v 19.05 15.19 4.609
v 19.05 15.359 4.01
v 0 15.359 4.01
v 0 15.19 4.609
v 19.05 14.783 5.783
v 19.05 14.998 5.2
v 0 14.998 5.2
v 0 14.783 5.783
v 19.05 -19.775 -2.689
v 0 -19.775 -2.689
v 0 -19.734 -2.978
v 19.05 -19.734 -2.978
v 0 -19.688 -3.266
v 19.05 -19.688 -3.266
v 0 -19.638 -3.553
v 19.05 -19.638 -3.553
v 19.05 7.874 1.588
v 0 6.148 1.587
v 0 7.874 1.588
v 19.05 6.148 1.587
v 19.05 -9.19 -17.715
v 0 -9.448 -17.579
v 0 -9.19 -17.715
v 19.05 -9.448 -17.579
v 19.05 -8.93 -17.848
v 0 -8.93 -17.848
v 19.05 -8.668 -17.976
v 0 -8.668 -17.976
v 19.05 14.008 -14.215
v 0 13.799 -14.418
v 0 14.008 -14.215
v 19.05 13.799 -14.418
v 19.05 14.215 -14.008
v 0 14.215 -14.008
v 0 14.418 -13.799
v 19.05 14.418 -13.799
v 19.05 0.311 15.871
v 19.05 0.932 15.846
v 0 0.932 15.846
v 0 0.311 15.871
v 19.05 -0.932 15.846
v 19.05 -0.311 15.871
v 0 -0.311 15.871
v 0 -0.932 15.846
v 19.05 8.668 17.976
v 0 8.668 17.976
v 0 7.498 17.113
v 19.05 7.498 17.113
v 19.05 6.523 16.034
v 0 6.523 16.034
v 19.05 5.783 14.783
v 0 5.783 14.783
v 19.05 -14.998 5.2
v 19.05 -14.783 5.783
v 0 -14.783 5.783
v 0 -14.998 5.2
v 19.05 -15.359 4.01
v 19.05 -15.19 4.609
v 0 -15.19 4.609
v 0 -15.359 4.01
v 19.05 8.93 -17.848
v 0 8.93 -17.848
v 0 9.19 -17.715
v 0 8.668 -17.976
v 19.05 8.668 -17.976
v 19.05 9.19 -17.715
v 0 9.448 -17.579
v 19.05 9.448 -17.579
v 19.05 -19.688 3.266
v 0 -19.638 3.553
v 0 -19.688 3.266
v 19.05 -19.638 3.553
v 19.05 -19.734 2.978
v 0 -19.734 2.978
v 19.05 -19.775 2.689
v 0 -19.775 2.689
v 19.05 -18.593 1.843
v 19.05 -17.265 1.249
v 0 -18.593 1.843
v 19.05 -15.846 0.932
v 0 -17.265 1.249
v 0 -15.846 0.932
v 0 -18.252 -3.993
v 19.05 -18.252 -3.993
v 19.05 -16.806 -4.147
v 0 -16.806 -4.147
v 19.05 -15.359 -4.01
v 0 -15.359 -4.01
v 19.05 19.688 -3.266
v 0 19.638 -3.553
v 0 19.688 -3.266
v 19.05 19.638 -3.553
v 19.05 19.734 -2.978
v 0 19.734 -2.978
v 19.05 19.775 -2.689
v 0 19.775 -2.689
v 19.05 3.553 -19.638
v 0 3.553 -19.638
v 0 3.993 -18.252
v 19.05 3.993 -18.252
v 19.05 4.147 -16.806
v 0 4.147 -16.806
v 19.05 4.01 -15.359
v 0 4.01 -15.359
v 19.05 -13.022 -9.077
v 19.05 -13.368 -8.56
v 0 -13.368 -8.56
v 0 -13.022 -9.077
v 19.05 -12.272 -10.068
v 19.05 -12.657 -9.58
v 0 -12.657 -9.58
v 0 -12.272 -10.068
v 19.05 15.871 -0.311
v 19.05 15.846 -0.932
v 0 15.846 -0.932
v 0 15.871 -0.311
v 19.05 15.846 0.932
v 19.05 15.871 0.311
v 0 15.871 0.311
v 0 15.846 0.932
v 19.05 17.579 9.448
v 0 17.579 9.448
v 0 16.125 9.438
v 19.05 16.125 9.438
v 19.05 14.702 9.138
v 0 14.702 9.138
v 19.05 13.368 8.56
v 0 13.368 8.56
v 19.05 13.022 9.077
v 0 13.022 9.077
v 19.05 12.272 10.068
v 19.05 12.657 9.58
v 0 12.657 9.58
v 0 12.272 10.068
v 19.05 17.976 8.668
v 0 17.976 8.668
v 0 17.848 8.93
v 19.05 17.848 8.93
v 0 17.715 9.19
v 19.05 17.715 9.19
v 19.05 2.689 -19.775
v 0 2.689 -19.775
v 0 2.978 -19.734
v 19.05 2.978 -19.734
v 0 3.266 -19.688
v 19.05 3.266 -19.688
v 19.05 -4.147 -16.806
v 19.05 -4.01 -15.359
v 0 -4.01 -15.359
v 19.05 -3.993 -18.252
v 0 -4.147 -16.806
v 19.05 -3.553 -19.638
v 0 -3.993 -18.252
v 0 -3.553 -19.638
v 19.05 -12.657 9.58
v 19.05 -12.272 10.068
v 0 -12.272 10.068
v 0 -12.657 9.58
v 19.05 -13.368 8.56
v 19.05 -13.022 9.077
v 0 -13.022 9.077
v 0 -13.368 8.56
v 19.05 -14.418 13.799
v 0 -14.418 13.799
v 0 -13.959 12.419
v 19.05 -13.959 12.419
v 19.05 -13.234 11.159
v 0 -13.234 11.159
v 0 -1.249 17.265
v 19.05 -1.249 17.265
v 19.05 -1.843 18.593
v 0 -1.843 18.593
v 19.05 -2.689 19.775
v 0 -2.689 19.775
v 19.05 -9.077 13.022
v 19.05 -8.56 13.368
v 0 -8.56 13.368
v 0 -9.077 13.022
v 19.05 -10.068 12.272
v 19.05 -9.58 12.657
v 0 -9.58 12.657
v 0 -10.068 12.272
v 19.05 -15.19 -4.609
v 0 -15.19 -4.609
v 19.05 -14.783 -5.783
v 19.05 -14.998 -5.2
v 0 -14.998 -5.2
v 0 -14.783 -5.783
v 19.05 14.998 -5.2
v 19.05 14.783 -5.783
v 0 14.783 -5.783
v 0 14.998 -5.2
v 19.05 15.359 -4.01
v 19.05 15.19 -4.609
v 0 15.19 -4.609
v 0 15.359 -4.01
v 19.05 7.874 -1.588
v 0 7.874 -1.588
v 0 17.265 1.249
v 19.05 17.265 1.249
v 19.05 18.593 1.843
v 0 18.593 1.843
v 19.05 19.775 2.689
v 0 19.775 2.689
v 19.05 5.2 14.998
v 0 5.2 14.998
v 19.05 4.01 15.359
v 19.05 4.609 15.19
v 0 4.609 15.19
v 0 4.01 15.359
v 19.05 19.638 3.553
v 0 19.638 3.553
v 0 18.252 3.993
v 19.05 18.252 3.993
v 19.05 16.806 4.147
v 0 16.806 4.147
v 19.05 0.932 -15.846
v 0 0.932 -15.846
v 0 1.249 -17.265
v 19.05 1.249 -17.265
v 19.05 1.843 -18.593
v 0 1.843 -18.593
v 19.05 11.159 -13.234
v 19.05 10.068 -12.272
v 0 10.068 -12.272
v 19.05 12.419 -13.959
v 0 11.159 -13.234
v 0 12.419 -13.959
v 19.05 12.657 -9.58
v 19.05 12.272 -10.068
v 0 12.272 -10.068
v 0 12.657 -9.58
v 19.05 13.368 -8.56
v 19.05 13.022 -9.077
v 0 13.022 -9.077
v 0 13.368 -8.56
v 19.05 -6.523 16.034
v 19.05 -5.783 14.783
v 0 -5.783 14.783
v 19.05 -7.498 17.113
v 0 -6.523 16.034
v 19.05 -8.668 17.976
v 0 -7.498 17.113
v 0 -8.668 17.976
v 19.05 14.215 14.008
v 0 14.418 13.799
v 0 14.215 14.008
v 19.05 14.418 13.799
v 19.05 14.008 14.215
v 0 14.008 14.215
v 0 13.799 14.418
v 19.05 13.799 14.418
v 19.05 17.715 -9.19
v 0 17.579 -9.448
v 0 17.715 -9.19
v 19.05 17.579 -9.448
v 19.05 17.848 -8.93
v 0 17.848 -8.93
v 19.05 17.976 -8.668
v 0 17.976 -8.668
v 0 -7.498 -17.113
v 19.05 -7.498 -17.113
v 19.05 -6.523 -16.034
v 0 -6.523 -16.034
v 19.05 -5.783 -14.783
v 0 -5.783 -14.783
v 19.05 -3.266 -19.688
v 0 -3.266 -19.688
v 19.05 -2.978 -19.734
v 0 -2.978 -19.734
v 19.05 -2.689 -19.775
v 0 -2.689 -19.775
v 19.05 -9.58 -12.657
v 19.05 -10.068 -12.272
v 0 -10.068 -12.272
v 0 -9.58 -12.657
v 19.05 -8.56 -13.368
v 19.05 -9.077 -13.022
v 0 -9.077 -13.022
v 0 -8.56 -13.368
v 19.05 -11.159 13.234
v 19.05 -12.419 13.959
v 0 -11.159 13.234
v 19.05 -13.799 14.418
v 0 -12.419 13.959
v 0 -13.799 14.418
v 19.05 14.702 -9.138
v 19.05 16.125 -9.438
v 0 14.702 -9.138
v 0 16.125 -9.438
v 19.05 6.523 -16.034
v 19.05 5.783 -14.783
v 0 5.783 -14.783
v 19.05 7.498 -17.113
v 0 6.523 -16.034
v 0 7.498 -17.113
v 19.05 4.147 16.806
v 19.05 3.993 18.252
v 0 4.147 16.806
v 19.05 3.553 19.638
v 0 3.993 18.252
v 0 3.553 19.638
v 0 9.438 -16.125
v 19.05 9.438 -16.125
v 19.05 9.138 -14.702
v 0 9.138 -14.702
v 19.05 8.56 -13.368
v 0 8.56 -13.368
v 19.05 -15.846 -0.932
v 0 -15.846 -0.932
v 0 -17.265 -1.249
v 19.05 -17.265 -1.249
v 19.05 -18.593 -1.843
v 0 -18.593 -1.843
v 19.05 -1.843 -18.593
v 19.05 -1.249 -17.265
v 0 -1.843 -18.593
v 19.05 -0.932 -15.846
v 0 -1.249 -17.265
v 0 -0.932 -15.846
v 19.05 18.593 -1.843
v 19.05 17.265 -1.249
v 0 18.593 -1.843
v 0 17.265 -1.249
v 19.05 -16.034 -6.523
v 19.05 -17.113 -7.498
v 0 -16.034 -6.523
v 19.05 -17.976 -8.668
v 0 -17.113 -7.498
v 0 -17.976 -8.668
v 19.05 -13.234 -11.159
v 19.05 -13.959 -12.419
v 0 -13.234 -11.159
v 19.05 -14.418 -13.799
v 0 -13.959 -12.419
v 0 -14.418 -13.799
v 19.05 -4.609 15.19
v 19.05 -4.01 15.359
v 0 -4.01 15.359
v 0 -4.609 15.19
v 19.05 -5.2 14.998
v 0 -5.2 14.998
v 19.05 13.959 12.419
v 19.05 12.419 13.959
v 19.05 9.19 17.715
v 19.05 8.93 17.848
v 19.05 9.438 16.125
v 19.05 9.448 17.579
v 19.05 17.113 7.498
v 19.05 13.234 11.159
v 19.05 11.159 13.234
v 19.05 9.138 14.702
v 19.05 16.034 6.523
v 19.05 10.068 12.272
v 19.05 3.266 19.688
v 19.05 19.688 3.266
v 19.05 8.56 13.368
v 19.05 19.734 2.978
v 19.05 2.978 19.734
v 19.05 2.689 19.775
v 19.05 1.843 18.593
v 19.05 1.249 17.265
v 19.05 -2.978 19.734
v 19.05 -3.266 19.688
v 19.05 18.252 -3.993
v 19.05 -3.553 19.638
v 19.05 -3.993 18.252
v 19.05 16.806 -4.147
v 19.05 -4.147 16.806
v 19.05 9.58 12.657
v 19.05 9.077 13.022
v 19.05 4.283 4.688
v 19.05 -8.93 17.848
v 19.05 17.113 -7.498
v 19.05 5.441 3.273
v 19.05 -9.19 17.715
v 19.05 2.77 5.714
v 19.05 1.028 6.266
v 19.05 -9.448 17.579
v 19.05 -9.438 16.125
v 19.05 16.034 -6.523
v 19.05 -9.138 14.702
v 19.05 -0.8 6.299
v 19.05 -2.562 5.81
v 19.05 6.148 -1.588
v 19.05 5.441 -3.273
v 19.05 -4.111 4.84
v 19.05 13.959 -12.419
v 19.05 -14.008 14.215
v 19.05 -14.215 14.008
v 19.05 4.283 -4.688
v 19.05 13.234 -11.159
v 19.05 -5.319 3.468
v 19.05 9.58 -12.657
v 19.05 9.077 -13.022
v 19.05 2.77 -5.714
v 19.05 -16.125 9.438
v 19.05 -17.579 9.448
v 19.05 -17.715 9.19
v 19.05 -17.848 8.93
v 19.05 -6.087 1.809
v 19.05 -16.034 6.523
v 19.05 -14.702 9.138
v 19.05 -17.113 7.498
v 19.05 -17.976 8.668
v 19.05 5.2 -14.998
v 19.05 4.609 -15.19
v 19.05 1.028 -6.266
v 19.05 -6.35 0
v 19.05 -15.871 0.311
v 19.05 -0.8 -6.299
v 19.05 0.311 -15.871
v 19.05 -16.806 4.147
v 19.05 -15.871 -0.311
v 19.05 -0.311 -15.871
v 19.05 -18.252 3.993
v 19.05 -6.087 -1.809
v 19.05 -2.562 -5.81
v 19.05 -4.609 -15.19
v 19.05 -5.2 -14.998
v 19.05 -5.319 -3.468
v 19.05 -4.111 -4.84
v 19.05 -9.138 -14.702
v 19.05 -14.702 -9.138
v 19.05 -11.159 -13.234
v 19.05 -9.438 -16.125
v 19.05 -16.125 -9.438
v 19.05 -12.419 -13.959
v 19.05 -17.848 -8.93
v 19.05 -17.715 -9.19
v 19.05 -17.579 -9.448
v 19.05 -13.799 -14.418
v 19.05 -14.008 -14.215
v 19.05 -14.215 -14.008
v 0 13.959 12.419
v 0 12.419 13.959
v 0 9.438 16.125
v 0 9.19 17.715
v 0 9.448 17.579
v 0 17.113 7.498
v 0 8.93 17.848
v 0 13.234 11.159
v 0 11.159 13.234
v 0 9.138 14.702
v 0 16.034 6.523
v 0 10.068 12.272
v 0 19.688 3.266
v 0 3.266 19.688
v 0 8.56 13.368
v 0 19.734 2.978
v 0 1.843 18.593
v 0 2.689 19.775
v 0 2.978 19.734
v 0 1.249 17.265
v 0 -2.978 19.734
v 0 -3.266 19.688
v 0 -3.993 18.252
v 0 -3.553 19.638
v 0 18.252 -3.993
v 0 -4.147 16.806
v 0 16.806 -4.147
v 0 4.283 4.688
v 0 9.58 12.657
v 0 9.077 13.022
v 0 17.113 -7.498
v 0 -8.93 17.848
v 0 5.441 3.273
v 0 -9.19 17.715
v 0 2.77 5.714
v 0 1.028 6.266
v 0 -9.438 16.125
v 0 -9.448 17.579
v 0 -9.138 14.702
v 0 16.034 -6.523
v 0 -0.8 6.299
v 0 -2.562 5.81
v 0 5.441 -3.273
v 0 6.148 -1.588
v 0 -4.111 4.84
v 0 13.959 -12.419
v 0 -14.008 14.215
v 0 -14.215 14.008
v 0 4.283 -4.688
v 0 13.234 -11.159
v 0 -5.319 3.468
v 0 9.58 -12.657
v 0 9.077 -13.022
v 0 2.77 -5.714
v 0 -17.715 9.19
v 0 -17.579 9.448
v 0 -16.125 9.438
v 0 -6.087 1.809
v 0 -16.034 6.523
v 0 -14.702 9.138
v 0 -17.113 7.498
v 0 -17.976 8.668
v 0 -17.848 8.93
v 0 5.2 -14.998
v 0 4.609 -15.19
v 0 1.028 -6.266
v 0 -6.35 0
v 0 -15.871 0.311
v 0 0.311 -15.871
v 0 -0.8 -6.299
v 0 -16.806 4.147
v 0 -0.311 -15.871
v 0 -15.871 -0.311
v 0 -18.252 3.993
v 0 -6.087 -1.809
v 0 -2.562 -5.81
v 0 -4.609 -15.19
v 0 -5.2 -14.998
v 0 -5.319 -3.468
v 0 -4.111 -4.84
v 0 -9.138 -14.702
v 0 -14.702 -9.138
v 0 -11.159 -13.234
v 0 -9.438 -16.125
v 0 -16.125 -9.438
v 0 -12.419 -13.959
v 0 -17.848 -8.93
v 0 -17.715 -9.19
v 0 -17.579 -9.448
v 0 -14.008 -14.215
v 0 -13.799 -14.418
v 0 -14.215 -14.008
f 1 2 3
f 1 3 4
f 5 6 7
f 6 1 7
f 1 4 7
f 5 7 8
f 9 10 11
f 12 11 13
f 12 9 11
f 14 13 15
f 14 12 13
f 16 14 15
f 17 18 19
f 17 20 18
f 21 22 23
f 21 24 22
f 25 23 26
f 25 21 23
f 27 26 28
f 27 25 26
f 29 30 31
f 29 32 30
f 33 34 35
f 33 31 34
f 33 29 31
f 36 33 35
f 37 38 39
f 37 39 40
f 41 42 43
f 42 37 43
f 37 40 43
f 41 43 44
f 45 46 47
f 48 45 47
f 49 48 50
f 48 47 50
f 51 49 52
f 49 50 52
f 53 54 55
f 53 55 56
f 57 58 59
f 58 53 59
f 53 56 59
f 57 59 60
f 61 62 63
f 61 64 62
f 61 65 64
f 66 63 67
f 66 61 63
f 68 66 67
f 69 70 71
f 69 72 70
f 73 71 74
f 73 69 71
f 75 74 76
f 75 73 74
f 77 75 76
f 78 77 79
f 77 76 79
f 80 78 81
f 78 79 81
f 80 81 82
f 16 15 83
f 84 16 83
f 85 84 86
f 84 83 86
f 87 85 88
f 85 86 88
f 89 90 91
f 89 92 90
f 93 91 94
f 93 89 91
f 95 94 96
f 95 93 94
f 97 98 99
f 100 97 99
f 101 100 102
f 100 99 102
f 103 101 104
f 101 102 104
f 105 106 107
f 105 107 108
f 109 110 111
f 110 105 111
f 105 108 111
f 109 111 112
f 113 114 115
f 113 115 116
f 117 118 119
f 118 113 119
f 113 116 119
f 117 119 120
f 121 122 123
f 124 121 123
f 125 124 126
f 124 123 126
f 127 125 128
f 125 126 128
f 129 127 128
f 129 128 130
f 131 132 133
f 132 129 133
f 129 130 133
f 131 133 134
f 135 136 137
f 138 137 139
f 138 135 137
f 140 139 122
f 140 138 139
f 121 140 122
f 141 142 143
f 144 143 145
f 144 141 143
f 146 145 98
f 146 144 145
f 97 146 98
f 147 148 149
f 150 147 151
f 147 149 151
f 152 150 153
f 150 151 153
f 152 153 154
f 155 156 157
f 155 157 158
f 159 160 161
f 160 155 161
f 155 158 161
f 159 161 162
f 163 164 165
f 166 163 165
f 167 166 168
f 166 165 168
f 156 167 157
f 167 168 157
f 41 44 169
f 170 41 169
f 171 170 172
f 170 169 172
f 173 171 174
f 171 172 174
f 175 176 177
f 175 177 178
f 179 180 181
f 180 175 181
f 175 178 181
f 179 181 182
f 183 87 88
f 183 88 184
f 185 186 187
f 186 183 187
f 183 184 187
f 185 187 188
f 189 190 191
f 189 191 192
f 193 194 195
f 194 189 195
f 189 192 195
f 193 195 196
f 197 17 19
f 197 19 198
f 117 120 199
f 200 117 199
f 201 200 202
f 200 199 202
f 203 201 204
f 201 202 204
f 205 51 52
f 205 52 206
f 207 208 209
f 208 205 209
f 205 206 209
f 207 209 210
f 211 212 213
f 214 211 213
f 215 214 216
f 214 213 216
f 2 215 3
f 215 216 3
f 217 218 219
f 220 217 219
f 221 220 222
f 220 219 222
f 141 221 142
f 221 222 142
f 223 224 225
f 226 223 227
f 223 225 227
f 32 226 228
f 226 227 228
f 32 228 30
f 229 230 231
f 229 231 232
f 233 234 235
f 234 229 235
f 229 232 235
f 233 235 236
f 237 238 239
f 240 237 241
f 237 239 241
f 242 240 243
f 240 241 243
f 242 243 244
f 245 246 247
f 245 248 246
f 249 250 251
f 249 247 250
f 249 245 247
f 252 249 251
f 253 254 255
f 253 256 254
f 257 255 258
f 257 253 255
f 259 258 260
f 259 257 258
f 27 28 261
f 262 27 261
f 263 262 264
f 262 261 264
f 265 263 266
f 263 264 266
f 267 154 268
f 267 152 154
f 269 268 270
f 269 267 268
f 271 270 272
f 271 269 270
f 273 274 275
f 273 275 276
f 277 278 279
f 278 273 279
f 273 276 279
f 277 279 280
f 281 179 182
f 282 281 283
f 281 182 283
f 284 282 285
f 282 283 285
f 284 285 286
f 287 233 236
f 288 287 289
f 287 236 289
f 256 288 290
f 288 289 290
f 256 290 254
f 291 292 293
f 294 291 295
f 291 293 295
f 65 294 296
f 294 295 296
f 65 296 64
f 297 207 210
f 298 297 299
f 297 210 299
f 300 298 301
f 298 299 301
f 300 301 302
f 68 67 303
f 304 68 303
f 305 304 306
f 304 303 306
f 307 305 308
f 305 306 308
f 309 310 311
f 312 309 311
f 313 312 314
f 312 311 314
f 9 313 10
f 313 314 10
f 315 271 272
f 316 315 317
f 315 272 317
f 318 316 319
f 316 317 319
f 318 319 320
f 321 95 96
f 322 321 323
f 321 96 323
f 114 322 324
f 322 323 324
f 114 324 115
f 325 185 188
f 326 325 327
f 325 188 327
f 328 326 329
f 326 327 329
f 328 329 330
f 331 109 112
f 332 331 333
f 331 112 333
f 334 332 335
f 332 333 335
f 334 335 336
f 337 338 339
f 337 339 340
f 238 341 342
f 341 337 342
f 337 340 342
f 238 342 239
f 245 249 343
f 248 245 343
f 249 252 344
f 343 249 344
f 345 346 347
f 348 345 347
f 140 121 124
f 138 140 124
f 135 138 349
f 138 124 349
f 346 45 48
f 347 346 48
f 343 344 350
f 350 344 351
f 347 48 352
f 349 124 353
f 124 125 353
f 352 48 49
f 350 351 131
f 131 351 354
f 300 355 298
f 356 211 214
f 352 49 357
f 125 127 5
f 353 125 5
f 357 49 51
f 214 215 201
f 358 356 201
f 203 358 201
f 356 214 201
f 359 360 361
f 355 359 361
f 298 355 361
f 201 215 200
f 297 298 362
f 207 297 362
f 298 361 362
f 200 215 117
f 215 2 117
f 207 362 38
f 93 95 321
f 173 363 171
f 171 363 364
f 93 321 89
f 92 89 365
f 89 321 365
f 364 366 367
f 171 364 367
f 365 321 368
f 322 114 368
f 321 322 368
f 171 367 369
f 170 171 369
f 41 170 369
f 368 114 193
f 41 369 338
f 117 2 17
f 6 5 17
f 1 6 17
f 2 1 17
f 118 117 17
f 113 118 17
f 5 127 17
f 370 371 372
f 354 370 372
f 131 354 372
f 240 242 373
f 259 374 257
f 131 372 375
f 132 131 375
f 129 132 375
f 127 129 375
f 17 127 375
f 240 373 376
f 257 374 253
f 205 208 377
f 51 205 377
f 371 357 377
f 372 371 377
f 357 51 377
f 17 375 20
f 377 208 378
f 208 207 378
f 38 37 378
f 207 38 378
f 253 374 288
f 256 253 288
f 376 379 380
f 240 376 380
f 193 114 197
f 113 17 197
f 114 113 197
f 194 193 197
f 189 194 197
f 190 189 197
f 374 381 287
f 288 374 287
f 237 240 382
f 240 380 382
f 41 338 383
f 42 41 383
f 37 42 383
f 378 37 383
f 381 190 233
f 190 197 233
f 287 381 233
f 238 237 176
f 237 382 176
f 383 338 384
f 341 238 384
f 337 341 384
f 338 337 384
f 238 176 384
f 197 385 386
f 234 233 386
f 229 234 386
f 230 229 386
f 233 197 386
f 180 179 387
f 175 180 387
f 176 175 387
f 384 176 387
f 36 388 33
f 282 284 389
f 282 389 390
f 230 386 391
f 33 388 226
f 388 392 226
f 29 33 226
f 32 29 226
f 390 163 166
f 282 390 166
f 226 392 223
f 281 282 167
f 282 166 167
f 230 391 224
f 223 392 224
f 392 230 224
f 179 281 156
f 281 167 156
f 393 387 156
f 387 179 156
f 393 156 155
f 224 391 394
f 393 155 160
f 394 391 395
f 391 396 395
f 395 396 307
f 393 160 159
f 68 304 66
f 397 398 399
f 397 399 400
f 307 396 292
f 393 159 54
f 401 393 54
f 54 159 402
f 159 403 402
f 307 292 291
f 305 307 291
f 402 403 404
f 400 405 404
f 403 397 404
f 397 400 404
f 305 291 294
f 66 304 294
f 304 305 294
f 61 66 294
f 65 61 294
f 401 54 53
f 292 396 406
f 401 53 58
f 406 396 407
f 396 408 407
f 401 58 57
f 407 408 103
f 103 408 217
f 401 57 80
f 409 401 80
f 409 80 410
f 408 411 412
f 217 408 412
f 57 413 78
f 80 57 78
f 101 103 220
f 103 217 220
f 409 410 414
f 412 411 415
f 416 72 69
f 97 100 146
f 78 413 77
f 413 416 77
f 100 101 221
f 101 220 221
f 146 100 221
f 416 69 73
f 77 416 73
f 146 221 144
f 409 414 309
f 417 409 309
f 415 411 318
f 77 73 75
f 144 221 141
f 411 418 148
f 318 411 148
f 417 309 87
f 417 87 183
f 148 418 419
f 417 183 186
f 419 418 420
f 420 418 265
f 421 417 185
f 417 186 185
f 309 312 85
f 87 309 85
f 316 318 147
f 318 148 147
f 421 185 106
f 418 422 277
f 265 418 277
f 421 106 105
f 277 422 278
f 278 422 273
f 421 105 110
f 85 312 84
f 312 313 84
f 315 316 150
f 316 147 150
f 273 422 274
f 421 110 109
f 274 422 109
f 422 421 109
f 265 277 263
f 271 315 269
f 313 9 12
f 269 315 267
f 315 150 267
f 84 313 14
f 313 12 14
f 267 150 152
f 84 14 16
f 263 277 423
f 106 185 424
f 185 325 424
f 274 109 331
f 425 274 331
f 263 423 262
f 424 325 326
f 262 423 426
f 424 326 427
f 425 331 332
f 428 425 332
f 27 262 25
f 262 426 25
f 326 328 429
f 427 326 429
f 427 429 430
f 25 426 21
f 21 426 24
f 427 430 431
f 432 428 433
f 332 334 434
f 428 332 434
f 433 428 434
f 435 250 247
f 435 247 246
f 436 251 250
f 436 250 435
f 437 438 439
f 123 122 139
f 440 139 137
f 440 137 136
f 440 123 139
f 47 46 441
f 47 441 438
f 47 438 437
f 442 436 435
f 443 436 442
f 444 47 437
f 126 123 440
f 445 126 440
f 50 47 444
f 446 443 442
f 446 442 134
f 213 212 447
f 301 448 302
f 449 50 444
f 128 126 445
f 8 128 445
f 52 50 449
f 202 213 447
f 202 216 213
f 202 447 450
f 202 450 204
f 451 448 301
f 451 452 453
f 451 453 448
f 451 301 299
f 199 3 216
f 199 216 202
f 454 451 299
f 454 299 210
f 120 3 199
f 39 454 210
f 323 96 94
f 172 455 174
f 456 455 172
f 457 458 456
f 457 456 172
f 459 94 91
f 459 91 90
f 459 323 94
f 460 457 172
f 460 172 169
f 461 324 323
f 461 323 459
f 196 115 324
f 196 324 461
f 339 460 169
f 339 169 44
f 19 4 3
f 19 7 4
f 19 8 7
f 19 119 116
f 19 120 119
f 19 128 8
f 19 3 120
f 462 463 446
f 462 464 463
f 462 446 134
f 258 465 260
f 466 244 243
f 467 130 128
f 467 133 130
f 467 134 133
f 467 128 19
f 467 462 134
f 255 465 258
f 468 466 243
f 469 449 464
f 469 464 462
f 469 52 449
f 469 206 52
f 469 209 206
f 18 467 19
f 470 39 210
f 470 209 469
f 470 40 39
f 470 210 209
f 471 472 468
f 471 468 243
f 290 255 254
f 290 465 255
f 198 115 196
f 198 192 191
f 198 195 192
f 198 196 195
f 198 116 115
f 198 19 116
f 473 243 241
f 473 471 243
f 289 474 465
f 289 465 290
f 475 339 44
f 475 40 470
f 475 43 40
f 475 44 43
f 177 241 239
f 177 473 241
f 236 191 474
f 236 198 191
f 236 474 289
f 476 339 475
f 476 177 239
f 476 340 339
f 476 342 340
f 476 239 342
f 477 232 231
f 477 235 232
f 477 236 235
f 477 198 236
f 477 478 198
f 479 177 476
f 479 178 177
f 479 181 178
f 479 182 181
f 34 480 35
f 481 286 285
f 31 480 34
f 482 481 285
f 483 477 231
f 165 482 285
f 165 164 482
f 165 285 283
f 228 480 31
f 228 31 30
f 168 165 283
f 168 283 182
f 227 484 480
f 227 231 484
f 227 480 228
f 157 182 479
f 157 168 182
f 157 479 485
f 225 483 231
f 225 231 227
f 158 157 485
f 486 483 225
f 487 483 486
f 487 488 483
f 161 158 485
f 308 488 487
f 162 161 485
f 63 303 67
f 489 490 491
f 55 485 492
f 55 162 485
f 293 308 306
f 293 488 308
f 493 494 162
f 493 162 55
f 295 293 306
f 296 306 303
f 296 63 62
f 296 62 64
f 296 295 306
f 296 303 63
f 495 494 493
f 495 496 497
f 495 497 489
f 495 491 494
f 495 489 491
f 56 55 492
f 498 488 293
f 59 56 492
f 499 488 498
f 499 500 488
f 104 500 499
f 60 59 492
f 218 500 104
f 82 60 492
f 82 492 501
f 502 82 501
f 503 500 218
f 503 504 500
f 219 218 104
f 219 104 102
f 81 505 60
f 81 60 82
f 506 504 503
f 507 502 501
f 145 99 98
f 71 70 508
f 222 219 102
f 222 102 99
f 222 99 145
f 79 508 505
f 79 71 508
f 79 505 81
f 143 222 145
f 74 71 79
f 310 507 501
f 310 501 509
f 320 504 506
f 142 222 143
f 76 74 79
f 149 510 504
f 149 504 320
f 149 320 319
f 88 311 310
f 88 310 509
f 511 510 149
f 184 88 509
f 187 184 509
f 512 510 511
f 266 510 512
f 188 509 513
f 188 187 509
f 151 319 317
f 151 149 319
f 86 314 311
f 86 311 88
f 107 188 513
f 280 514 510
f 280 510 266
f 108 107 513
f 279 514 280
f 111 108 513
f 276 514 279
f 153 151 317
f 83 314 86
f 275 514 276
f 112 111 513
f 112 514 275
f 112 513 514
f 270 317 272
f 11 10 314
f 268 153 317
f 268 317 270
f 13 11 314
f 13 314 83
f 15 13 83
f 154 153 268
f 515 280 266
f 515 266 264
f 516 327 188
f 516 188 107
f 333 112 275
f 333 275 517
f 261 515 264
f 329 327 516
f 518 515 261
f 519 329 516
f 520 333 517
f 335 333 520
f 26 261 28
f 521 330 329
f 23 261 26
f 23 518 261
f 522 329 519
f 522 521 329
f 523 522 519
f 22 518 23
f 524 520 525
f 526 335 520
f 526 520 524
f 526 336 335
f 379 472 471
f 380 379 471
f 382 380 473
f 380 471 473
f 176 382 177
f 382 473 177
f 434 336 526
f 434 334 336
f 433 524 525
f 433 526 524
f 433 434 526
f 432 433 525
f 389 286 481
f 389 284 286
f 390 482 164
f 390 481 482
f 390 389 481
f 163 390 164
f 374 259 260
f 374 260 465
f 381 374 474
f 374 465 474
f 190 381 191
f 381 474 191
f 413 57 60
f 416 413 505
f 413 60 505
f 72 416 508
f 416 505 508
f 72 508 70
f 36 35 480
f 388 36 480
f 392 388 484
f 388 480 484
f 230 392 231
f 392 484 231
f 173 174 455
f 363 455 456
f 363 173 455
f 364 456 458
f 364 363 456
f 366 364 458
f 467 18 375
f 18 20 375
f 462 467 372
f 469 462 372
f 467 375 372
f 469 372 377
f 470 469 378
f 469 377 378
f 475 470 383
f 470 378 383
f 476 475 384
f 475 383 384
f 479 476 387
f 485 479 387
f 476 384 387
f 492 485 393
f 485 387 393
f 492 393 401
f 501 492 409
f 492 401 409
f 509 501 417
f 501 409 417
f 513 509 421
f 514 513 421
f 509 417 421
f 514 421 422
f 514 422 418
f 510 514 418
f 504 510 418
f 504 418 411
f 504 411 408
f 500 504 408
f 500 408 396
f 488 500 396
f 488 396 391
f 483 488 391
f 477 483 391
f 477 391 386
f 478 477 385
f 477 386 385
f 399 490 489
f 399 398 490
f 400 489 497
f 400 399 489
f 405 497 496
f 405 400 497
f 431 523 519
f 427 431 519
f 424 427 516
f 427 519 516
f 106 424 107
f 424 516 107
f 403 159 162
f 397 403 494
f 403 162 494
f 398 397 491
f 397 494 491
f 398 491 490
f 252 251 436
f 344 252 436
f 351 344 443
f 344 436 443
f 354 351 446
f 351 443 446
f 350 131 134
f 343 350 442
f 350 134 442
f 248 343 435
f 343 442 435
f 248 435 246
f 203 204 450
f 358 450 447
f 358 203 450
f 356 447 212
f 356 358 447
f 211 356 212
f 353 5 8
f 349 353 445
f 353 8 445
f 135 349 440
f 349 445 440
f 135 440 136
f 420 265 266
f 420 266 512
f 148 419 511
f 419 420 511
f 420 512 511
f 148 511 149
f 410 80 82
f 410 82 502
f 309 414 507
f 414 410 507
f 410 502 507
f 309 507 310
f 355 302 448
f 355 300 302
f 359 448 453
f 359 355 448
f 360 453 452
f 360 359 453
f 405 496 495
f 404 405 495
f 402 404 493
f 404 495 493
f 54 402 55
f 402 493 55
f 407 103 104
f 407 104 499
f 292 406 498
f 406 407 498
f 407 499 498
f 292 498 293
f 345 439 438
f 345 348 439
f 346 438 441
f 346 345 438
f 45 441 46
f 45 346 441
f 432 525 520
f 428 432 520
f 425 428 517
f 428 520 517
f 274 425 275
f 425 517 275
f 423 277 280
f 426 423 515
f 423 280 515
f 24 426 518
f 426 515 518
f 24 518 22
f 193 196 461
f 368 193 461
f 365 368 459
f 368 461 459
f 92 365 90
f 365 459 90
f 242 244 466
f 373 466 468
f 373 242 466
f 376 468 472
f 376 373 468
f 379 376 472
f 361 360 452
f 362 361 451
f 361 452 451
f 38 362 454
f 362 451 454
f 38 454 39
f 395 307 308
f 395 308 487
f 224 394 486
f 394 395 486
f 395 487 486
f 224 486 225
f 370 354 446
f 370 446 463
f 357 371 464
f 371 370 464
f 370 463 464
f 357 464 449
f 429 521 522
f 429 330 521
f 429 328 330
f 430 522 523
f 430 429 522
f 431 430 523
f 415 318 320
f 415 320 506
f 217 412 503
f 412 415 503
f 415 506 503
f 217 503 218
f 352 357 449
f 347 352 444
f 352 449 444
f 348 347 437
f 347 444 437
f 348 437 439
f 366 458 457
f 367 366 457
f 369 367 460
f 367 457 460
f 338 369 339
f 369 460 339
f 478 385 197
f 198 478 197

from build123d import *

# Parameters (mm, degrees)
BASPROSKE_W             = 19.05
BASPROSKE_H             = 19.957142857
TOOTHCUT_DEPTH          = 35.051102802
TEETHCUTS_COUNT         = 20
BORSKE_R                = 6.35
BORE_DEPTH              = 50.8000508
KEYSKE_W                = 3.175
KEYSKE_H                = 7.4676
KEYWAY_DEPTH            = 50.8000508
SKETCH1_W               = 3.175
SKETCH1_H               = 0.4064
CUT_EXTRUDE4_DEPTH      = 34.838053031
CUT_EXTRUDE4_DEPTH_BACK = 34.838053031


with BuildPart() as part:
    # BasProSke → Base-Revolve (revolve)
    with BuildSketch(Plane(origin=(0, 0, 0), x_dir=(1, 0, 0), z_dir=(0, 1, 0)), mode=Mode.PRIVATE) as base_revolve_sk:
        with Locations((9.525, 9.978571429)):
            Rectangle(BASPROSKE_W, BASPROSKE_H)
    revolve(base_revolve_sk.sketch.rotate(Axis((-10, 0, 0), (1, 0, 0)), 180), axis=Axis((-10, 0, 0), (1, 0, 0)))

    # TooCutSke → ToothCut (cut, through all)
    with BuildSketch(Plane(origin=(0, 0, 0), x_dir=(0, 0, -1), z_dir=(1, 0, 0))):
        with BuildLine():
            ThreePointArc((0.93220263, 15.846334036), (0, 15.87373), (-0.93220263, 15.846334036))
            ThreePointArc((-0.93220263, 15.846334036), (-1.519014467, 17.957902446), (-2.709431151, 19.798004997))
            ThreePointArc((-2.709431151, 19.798004997), (0, 19.982542857), (2.709431151, 19.798004997))
            ThreePointArc((2.709431151, 19.798004997), (1.519014467, 17.957902446), (0.93220263, 15.846334036))
        make_face()
    toothcut = extrude(amount=TOOTHCUT_DEPTH, mode=Mode.SUBTRACT)

    # TeethCuts: ToothCut ×20 about axis
    teethcuts_axis = Axis((0, 0, 0), (1, 0, 0))
    for i in range(1, TEETHCUTS_COUNT):
        add(toothcut.rotate(teethcuts_axis, i * 360 / TEETHCUTS_COUNT), mode=Mode.SUBTRACT)

    # BorSke → Bore (cut, symmetric)
    with BuildSketch(Plane(origin=(0, 0, 0), x_dir=(0, 0, -1), z_dir=(1, 0, 0))):
        with Locations(Location((0, 0, 0), (0, 0, 180))):
            Circle(BORSKE_R)
    extrude(amount=BORE_DEPTH, both=True, mode=Mode.SUBTRACT)

    # KeySke → Keyway (cut, symmetric)
    with BuildSketch(Plane(origin=(0, 0, 0), x_dir=(0, 0, -1), z_dir=(1, 0, 0))):
        with Locations((0, 3.7338)):
            Rectangle(KEYSKE_W, KEYSKE_H)
    extrude(amount=KEYWAY_DEPTH, both=True, mode=Mode.SUBTRACT)

    # Sketch1 → Cut-Extrude4 (cut, two sides)
    with BuildSketch(Plane(origin=(19.05, 0, 0), x_dir=(0, 0, -1), z_dir=(1, 0, 0))) as cut_extrude4_sk:
        with Locations((0, 7.6708)):
            Rectangle(SKETCH1_W, SKETCH1_H)
    extrude(amount=CUT_EXTRUDE4_DEPTH, mode=Mode.SUBTRACT)
    extrude(cut_extrude4_sk.sketch, amount=-CUT_EXTRUDE4_DEPTH_BACK, mode=Mode.SUBTRACT)


solid = part.part
